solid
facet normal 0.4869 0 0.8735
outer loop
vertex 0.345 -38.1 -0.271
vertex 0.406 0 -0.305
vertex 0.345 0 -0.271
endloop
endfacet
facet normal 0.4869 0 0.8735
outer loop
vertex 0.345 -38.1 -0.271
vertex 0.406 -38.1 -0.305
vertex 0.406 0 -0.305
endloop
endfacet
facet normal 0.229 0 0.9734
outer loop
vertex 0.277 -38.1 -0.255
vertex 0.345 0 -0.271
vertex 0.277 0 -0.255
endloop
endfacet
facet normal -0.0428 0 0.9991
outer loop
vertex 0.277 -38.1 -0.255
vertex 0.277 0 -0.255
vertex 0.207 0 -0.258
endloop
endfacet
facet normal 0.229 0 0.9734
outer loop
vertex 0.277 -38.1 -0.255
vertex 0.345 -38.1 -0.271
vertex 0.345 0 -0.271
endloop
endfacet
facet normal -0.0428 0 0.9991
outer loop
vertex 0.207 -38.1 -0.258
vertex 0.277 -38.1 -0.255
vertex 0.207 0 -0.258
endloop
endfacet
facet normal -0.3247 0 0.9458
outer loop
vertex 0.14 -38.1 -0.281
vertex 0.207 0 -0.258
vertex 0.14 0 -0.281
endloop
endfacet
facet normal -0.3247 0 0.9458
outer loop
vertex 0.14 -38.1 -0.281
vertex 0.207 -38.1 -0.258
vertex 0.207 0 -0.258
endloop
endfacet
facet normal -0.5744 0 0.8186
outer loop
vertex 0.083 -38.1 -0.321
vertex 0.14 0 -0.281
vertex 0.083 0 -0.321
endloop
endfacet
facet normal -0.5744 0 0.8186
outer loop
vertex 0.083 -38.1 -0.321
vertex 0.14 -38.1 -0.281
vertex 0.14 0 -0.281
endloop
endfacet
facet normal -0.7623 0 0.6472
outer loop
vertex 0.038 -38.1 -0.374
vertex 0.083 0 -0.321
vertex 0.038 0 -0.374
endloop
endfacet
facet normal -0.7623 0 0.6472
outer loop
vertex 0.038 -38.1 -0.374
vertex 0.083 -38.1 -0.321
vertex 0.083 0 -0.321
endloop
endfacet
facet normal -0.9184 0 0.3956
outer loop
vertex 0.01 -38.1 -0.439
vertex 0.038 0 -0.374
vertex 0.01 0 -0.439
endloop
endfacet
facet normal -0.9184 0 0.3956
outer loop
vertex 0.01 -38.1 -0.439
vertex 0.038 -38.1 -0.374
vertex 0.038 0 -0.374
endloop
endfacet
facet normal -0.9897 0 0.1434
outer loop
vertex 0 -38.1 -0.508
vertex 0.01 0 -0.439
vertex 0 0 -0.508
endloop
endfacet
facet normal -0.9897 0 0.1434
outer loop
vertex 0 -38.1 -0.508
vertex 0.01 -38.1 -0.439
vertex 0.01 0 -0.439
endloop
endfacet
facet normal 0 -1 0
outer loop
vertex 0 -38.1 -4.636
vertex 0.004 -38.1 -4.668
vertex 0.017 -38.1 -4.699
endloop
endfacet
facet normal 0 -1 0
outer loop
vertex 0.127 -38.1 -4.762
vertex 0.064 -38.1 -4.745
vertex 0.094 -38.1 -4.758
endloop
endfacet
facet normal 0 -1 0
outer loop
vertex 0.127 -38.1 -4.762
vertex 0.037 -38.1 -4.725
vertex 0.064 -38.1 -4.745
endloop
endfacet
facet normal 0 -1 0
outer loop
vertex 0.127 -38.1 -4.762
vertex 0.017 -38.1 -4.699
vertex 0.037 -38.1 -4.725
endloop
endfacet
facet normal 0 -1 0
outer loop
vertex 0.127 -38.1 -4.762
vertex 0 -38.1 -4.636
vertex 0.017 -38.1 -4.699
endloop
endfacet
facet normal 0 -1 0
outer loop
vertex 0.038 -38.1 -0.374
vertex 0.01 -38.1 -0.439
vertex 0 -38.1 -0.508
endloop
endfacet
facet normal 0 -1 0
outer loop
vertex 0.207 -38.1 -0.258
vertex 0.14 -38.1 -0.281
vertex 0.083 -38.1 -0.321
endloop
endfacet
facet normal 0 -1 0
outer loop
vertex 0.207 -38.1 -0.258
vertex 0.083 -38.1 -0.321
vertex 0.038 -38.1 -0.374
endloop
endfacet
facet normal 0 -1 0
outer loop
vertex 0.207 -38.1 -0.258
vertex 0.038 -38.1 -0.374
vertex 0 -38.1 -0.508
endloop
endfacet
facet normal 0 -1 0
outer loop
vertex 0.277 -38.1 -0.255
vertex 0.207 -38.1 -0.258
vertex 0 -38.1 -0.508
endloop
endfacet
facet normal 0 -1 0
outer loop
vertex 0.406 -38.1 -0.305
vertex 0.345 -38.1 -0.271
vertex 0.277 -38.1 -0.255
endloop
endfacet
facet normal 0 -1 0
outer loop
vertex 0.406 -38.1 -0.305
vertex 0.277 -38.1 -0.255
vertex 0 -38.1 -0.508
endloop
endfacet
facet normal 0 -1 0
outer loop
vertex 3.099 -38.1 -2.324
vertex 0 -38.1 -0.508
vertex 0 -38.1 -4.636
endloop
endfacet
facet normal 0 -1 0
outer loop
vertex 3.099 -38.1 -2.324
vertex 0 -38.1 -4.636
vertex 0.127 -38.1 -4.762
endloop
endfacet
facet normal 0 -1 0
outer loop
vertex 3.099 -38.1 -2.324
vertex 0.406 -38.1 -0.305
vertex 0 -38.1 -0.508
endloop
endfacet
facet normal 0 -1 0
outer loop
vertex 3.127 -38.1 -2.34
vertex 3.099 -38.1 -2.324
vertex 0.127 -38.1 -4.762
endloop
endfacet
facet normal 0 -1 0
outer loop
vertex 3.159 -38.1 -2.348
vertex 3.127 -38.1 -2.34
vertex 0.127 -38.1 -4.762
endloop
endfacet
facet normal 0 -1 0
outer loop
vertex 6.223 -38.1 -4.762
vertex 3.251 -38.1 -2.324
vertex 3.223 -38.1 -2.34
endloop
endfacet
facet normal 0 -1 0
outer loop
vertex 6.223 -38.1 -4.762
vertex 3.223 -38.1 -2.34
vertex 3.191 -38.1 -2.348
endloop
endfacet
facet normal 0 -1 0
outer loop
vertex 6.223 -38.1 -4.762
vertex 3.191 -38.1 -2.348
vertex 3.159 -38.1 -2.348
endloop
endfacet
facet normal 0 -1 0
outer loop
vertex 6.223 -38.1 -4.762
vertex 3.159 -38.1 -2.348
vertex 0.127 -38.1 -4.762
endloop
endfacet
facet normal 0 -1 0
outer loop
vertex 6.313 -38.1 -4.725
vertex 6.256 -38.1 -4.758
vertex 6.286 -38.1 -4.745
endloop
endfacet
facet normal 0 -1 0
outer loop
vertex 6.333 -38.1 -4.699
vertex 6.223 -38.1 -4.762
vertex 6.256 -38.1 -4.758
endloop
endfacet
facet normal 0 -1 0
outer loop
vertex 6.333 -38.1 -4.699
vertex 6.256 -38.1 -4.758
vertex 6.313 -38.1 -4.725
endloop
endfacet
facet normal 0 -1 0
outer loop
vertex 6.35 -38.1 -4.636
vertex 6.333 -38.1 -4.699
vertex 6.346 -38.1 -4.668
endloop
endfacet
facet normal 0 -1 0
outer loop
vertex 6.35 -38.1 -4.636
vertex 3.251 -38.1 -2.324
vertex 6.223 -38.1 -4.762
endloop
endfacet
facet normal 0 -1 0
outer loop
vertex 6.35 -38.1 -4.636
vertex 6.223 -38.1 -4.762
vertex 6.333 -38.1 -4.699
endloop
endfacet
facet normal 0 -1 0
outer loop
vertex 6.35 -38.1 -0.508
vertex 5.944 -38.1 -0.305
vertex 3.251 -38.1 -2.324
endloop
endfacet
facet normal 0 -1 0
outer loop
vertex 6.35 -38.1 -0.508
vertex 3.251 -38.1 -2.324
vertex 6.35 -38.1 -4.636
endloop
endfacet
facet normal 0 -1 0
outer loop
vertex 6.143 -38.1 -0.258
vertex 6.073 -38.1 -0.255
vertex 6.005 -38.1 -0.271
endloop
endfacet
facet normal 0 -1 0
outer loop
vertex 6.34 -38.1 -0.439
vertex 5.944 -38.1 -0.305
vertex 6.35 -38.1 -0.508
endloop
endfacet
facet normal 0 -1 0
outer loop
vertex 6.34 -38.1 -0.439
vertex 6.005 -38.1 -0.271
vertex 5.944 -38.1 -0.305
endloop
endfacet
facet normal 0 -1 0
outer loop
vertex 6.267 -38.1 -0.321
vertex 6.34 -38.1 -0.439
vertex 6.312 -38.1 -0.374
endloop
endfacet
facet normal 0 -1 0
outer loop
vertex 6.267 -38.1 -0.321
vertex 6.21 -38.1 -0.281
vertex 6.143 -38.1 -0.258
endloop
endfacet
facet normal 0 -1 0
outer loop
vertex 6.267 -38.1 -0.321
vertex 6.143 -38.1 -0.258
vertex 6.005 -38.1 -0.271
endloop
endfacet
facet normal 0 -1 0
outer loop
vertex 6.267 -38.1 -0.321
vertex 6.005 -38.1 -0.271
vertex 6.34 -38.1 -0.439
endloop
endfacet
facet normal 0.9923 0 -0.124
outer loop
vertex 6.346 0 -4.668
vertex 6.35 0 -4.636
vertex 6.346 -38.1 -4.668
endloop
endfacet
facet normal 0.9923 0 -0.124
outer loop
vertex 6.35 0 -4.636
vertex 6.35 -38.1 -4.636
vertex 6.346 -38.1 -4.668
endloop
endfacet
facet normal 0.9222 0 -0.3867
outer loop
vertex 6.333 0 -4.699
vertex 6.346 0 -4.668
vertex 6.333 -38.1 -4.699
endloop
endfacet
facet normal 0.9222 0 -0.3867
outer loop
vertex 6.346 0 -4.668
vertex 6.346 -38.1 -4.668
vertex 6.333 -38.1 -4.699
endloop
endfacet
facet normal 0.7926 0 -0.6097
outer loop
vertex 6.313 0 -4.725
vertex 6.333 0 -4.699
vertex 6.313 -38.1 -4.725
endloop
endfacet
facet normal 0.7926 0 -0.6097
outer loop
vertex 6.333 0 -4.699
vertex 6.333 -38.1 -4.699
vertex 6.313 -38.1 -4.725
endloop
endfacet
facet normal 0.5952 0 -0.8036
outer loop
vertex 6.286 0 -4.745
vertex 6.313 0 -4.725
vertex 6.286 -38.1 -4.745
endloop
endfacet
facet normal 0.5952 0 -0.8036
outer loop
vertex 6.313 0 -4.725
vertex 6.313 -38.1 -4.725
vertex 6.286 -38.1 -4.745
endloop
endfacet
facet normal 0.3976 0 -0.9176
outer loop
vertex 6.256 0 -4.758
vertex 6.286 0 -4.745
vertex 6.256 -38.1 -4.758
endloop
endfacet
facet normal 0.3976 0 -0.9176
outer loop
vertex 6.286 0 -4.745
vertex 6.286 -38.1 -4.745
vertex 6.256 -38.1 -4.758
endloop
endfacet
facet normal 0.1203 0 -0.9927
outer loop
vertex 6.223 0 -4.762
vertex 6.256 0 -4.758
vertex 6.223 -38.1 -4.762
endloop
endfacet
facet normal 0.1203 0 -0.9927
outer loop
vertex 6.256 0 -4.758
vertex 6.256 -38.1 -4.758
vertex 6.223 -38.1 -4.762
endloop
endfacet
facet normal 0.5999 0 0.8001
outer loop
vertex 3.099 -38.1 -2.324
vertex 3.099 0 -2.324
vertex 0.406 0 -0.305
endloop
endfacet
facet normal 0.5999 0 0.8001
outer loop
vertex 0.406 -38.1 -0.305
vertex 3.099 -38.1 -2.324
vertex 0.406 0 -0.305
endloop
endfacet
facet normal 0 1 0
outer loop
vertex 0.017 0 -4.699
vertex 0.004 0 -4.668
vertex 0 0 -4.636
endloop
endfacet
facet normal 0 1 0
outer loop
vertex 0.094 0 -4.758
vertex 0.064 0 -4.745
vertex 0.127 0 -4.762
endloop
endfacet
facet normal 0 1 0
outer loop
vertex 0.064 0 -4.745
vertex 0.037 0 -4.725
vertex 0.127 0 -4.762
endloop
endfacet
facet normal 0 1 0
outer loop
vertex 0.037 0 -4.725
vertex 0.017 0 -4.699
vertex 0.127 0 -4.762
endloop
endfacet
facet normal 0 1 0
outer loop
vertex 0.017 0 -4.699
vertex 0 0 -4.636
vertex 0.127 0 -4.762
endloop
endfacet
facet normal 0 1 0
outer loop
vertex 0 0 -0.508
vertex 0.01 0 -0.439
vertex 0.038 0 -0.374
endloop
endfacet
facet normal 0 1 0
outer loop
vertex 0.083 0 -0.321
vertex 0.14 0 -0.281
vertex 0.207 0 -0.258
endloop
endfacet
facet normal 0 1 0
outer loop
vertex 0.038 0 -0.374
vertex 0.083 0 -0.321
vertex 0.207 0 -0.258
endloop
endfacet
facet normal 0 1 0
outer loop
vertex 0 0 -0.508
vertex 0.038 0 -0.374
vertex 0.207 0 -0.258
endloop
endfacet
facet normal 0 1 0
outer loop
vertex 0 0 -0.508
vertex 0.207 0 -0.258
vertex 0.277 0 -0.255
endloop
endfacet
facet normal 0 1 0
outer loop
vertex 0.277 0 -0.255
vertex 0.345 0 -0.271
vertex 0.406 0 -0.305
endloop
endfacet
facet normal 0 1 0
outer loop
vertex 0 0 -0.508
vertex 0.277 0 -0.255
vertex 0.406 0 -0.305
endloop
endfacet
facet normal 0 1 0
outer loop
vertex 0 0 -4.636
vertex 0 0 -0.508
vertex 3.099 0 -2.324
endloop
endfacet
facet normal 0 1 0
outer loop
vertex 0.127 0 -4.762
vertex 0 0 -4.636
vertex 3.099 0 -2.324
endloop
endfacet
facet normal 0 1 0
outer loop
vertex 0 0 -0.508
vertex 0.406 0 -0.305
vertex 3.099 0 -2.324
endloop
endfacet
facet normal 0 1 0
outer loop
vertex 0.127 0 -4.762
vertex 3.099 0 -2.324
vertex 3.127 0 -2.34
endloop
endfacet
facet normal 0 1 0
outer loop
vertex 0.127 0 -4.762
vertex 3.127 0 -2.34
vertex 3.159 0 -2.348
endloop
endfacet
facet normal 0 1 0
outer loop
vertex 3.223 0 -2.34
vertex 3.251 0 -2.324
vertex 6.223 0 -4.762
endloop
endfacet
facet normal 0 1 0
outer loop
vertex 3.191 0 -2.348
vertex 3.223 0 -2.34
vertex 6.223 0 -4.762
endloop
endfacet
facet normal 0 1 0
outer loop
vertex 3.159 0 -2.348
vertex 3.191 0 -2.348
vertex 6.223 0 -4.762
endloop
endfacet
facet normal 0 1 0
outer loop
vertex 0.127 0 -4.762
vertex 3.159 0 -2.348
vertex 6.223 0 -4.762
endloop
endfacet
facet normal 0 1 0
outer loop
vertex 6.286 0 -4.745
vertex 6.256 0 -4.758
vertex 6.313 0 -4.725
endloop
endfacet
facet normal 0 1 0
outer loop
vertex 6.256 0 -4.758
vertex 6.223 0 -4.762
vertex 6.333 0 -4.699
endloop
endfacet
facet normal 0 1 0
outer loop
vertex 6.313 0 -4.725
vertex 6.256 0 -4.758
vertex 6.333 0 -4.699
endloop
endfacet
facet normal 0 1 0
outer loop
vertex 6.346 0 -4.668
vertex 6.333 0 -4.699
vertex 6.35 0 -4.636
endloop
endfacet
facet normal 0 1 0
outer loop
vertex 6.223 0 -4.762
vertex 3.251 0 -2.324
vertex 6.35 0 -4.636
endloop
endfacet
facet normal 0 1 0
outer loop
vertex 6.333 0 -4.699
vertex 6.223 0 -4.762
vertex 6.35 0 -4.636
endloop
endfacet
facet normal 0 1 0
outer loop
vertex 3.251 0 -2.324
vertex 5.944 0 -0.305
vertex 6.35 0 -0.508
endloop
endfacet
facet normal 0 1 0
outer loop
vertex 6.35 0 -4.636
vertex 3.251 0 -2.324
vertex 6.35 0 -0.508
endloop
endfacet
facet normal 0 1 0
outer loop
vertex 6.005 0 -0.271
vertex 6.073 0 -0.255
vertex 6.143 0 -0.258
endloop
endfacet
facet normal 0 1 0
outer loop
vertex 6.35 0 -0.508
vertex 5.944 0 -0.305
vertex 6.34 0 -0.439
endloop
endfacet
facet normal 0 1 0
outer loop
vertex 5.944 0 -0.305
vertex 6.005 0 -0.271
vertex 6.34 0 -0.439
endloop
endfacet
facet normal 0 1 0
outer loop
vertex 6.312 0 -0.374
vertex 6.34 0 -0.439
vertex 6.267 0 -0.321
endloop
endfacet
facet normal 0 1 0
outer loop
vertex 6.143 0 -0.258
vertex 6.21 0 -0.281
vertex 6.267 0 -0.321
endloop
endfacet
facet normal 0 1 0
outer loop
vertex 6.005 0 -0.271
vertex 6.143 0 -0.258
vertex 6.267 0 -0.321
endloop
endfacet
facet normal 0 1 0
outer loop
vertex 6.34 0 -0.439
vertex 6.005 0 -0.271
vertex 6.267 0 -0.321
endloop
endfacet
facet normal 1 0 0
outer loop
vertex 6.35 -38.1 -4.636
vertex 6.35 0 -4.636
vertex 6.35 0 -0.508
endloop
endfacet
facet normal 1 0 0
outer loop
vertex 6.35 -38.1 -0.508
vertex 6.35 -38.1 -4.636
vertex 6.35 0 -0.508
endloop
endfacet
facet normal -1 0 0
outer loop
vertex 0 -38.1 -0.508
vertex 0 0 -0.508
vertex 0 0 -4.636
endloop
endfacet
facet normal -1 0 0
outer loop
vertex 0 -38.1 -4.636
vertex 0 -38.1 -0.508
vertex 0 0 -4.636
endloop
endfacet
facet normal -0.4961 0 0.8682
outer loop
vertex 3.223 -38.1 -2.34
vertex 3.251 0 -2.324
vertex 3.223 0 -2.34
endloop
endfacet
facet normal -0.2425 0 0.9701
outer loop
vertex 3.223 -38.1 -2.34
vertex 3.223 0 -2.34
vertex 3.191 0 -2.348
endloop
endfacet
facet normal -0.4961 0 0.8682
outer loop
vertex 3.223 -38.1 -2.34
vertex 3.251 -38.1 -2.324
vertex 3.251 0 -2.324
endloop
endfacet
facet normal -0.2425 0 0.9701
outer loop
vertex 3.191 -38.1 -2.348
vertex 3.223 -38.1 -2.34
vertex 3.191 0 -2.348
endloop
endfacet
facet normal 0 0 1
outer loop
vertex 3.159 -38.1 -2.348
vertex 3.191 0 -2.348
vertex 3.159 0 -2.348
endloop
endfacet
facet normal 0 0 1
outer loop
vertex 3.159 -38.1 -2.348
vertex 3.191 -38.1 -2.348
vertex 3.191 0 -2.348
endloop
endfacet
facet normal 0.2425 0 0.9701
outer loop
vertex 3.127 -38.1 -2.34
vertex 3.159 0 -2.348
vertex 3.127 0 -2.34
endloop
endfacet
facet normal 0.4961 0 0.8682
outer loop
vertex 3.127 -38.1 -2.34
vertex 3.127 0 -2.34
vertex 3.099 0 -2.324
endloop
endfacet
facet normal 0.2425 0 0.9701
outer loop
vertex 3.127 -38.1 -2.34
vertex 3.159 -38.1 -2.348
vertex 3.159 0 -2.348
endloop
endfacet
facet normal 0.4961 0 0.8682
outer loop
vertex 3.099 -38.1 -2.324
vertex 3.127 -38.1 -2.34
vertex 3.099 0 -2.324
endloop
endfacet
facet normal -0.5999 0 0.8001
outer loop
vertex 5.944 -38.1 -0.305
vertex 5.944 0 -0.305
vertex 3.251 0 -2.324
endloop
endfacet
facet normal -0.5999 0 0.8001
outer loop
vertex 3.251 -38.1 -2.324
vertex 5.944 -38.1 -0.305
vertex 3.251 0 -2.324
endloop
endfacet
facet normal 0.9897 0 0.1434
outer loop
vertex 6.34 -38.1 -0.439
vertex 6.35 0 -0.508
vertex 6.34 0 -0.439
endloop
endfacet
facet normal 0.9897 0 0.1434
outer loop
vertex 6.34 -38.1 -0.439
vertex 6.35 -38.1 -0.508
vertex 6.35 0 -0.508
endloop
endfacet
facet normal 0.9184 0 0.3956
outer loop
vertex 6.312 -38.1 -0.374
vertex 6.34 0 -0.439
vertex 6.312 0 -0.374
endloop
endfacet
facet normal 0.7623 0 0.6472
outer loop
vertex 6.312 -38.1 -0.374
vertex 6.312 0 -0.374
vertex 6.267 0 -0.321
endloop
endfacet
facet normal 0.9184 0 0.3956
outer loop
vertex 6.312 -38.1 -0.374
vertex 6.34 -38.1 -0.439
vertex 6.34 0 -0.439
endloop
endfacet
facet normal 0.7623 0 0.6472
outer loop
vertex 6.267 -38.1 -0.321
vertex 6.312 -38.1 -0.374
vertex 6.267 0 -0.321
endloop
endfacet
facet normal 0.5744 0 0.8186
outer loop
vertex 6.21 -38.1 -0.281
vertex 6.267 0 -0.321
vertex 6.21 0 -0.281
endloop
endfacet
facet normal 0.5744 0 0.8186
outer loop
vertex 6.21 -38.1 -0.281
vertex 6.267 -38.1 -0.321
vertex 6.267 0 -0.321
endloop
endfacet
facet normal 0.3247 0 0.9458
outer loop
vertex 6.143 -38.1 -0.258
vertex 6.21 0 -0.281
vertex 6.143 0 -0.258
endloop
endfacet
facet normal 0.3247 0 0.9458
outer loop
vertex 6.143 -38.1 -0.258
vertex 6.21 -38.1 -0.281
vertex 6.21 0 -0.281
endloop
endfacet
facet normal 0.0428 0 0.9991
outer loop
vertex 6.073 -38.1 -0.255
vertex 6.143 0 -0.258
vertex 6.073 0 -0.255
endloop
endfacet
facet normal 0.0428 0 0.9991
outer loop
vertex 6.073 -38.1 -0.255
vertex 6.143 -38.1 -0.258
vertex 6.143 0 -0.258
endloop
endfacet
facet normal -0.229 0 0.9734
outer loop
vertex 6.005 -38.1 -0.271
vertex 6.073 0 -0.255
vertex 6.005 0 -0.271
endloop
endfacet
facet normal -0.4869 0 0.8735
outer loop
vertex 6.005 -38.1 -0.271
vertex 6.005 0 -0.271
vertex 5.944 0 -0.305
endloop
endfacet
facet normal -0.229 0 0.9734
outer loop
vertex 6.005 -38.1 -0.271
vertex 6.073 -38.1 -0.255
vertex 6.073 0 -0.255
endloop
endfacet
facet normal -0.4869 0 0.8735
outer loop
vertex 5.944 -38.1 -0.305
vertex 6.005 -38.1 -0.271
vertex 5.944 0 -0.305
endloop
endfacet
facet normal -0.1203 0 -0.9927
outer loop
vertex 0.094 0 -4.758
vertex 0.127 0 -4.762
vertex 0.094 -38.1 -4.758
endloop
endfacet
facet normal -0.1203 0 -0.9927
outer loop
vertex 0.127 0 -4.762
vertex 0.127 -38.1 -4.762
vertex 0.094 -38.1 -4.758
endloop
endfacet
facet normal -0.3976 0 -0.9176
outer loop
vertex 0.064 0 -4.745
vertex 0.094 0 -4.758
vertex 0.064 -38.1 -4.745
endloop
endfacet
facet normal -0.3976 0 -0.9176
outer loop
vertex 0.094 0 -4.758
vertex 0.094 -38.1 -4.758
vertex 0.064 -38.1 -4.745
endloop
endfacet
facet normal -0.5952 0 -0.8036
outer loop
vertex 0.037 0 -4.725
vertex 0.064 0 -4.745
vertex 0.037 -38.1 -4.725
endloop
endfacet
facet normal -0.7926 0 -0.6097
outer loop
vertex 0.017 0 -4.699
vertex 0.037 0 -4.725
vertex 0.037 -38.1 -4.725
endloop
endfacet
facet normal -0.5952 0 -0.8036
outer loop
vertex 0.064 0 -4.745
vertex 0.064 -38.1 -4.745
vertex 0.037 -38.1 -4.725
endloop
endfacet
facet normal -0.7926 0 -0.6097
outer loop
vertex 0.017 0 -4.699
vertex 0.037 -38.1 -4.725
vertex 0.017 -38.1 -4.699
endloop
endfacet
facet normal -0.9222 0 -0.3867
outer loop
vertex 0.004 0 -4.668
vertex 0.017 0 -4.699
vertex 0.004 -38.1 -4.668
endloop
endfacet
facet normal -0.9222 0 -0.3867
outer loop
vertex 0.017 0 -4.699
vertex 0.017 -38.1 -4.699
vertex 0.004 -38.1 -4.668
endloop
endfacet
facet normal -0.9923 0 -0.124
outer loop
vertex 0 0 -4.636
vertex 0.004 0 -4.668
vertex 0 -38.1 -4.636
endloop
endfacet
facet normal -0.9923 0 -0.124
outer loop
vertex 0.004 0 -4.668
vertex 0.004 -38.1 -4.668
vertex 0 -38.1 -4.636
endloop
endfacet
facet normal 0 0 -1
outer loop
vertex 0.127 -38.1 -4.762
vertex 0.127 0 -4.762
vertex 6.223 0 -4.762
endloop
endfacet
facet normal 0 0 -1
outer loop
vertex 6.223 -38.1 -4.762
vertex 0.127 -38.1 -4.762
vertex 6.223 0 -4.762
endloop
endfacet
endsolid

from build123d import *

# Parameters (mm, degrees)
F1_DEPTH = 38.1
F2_R     = 0.254
F3_R     = 0.127


with BuildPart() as f1:
    # F0 (on Front) → F1 (new body)
    with BuildSketch(Plane.XZ):
        Polygon((3.175, -2.38125), (0, -2.38125), (0, -4.7625), (6.35, -4.7625), (6.35, -2.38125), align=None)
        Polygon((3.175, -2.38125), (0, 0), (0, -2.38125), align=None)
        Polygon((6.35, -2.38125), (6.35, 0), (3.175, -2.38125), align=None)
    extrude(amount=F1_DEPTH)

    # F2
    f2_edges = [f1.edges().sort_by_distance(p)[0] for p in [
        (0, -19.05, 0),
        (6.35, -19.05, 0),
    ]]
    fillet(f2_edges, radius=F2_R)

    # F3
    f3_edges = [f1.edges().sort_by_distance(p)[0] for p in [
        (3.175, -19.05, -2.38125),
        (6.35, -19.05, -4.7625),
        (0, -19.05, -4.7625),
    ]]
    fillet(f3_edges, radius=F3_R)


solid = f1.part
